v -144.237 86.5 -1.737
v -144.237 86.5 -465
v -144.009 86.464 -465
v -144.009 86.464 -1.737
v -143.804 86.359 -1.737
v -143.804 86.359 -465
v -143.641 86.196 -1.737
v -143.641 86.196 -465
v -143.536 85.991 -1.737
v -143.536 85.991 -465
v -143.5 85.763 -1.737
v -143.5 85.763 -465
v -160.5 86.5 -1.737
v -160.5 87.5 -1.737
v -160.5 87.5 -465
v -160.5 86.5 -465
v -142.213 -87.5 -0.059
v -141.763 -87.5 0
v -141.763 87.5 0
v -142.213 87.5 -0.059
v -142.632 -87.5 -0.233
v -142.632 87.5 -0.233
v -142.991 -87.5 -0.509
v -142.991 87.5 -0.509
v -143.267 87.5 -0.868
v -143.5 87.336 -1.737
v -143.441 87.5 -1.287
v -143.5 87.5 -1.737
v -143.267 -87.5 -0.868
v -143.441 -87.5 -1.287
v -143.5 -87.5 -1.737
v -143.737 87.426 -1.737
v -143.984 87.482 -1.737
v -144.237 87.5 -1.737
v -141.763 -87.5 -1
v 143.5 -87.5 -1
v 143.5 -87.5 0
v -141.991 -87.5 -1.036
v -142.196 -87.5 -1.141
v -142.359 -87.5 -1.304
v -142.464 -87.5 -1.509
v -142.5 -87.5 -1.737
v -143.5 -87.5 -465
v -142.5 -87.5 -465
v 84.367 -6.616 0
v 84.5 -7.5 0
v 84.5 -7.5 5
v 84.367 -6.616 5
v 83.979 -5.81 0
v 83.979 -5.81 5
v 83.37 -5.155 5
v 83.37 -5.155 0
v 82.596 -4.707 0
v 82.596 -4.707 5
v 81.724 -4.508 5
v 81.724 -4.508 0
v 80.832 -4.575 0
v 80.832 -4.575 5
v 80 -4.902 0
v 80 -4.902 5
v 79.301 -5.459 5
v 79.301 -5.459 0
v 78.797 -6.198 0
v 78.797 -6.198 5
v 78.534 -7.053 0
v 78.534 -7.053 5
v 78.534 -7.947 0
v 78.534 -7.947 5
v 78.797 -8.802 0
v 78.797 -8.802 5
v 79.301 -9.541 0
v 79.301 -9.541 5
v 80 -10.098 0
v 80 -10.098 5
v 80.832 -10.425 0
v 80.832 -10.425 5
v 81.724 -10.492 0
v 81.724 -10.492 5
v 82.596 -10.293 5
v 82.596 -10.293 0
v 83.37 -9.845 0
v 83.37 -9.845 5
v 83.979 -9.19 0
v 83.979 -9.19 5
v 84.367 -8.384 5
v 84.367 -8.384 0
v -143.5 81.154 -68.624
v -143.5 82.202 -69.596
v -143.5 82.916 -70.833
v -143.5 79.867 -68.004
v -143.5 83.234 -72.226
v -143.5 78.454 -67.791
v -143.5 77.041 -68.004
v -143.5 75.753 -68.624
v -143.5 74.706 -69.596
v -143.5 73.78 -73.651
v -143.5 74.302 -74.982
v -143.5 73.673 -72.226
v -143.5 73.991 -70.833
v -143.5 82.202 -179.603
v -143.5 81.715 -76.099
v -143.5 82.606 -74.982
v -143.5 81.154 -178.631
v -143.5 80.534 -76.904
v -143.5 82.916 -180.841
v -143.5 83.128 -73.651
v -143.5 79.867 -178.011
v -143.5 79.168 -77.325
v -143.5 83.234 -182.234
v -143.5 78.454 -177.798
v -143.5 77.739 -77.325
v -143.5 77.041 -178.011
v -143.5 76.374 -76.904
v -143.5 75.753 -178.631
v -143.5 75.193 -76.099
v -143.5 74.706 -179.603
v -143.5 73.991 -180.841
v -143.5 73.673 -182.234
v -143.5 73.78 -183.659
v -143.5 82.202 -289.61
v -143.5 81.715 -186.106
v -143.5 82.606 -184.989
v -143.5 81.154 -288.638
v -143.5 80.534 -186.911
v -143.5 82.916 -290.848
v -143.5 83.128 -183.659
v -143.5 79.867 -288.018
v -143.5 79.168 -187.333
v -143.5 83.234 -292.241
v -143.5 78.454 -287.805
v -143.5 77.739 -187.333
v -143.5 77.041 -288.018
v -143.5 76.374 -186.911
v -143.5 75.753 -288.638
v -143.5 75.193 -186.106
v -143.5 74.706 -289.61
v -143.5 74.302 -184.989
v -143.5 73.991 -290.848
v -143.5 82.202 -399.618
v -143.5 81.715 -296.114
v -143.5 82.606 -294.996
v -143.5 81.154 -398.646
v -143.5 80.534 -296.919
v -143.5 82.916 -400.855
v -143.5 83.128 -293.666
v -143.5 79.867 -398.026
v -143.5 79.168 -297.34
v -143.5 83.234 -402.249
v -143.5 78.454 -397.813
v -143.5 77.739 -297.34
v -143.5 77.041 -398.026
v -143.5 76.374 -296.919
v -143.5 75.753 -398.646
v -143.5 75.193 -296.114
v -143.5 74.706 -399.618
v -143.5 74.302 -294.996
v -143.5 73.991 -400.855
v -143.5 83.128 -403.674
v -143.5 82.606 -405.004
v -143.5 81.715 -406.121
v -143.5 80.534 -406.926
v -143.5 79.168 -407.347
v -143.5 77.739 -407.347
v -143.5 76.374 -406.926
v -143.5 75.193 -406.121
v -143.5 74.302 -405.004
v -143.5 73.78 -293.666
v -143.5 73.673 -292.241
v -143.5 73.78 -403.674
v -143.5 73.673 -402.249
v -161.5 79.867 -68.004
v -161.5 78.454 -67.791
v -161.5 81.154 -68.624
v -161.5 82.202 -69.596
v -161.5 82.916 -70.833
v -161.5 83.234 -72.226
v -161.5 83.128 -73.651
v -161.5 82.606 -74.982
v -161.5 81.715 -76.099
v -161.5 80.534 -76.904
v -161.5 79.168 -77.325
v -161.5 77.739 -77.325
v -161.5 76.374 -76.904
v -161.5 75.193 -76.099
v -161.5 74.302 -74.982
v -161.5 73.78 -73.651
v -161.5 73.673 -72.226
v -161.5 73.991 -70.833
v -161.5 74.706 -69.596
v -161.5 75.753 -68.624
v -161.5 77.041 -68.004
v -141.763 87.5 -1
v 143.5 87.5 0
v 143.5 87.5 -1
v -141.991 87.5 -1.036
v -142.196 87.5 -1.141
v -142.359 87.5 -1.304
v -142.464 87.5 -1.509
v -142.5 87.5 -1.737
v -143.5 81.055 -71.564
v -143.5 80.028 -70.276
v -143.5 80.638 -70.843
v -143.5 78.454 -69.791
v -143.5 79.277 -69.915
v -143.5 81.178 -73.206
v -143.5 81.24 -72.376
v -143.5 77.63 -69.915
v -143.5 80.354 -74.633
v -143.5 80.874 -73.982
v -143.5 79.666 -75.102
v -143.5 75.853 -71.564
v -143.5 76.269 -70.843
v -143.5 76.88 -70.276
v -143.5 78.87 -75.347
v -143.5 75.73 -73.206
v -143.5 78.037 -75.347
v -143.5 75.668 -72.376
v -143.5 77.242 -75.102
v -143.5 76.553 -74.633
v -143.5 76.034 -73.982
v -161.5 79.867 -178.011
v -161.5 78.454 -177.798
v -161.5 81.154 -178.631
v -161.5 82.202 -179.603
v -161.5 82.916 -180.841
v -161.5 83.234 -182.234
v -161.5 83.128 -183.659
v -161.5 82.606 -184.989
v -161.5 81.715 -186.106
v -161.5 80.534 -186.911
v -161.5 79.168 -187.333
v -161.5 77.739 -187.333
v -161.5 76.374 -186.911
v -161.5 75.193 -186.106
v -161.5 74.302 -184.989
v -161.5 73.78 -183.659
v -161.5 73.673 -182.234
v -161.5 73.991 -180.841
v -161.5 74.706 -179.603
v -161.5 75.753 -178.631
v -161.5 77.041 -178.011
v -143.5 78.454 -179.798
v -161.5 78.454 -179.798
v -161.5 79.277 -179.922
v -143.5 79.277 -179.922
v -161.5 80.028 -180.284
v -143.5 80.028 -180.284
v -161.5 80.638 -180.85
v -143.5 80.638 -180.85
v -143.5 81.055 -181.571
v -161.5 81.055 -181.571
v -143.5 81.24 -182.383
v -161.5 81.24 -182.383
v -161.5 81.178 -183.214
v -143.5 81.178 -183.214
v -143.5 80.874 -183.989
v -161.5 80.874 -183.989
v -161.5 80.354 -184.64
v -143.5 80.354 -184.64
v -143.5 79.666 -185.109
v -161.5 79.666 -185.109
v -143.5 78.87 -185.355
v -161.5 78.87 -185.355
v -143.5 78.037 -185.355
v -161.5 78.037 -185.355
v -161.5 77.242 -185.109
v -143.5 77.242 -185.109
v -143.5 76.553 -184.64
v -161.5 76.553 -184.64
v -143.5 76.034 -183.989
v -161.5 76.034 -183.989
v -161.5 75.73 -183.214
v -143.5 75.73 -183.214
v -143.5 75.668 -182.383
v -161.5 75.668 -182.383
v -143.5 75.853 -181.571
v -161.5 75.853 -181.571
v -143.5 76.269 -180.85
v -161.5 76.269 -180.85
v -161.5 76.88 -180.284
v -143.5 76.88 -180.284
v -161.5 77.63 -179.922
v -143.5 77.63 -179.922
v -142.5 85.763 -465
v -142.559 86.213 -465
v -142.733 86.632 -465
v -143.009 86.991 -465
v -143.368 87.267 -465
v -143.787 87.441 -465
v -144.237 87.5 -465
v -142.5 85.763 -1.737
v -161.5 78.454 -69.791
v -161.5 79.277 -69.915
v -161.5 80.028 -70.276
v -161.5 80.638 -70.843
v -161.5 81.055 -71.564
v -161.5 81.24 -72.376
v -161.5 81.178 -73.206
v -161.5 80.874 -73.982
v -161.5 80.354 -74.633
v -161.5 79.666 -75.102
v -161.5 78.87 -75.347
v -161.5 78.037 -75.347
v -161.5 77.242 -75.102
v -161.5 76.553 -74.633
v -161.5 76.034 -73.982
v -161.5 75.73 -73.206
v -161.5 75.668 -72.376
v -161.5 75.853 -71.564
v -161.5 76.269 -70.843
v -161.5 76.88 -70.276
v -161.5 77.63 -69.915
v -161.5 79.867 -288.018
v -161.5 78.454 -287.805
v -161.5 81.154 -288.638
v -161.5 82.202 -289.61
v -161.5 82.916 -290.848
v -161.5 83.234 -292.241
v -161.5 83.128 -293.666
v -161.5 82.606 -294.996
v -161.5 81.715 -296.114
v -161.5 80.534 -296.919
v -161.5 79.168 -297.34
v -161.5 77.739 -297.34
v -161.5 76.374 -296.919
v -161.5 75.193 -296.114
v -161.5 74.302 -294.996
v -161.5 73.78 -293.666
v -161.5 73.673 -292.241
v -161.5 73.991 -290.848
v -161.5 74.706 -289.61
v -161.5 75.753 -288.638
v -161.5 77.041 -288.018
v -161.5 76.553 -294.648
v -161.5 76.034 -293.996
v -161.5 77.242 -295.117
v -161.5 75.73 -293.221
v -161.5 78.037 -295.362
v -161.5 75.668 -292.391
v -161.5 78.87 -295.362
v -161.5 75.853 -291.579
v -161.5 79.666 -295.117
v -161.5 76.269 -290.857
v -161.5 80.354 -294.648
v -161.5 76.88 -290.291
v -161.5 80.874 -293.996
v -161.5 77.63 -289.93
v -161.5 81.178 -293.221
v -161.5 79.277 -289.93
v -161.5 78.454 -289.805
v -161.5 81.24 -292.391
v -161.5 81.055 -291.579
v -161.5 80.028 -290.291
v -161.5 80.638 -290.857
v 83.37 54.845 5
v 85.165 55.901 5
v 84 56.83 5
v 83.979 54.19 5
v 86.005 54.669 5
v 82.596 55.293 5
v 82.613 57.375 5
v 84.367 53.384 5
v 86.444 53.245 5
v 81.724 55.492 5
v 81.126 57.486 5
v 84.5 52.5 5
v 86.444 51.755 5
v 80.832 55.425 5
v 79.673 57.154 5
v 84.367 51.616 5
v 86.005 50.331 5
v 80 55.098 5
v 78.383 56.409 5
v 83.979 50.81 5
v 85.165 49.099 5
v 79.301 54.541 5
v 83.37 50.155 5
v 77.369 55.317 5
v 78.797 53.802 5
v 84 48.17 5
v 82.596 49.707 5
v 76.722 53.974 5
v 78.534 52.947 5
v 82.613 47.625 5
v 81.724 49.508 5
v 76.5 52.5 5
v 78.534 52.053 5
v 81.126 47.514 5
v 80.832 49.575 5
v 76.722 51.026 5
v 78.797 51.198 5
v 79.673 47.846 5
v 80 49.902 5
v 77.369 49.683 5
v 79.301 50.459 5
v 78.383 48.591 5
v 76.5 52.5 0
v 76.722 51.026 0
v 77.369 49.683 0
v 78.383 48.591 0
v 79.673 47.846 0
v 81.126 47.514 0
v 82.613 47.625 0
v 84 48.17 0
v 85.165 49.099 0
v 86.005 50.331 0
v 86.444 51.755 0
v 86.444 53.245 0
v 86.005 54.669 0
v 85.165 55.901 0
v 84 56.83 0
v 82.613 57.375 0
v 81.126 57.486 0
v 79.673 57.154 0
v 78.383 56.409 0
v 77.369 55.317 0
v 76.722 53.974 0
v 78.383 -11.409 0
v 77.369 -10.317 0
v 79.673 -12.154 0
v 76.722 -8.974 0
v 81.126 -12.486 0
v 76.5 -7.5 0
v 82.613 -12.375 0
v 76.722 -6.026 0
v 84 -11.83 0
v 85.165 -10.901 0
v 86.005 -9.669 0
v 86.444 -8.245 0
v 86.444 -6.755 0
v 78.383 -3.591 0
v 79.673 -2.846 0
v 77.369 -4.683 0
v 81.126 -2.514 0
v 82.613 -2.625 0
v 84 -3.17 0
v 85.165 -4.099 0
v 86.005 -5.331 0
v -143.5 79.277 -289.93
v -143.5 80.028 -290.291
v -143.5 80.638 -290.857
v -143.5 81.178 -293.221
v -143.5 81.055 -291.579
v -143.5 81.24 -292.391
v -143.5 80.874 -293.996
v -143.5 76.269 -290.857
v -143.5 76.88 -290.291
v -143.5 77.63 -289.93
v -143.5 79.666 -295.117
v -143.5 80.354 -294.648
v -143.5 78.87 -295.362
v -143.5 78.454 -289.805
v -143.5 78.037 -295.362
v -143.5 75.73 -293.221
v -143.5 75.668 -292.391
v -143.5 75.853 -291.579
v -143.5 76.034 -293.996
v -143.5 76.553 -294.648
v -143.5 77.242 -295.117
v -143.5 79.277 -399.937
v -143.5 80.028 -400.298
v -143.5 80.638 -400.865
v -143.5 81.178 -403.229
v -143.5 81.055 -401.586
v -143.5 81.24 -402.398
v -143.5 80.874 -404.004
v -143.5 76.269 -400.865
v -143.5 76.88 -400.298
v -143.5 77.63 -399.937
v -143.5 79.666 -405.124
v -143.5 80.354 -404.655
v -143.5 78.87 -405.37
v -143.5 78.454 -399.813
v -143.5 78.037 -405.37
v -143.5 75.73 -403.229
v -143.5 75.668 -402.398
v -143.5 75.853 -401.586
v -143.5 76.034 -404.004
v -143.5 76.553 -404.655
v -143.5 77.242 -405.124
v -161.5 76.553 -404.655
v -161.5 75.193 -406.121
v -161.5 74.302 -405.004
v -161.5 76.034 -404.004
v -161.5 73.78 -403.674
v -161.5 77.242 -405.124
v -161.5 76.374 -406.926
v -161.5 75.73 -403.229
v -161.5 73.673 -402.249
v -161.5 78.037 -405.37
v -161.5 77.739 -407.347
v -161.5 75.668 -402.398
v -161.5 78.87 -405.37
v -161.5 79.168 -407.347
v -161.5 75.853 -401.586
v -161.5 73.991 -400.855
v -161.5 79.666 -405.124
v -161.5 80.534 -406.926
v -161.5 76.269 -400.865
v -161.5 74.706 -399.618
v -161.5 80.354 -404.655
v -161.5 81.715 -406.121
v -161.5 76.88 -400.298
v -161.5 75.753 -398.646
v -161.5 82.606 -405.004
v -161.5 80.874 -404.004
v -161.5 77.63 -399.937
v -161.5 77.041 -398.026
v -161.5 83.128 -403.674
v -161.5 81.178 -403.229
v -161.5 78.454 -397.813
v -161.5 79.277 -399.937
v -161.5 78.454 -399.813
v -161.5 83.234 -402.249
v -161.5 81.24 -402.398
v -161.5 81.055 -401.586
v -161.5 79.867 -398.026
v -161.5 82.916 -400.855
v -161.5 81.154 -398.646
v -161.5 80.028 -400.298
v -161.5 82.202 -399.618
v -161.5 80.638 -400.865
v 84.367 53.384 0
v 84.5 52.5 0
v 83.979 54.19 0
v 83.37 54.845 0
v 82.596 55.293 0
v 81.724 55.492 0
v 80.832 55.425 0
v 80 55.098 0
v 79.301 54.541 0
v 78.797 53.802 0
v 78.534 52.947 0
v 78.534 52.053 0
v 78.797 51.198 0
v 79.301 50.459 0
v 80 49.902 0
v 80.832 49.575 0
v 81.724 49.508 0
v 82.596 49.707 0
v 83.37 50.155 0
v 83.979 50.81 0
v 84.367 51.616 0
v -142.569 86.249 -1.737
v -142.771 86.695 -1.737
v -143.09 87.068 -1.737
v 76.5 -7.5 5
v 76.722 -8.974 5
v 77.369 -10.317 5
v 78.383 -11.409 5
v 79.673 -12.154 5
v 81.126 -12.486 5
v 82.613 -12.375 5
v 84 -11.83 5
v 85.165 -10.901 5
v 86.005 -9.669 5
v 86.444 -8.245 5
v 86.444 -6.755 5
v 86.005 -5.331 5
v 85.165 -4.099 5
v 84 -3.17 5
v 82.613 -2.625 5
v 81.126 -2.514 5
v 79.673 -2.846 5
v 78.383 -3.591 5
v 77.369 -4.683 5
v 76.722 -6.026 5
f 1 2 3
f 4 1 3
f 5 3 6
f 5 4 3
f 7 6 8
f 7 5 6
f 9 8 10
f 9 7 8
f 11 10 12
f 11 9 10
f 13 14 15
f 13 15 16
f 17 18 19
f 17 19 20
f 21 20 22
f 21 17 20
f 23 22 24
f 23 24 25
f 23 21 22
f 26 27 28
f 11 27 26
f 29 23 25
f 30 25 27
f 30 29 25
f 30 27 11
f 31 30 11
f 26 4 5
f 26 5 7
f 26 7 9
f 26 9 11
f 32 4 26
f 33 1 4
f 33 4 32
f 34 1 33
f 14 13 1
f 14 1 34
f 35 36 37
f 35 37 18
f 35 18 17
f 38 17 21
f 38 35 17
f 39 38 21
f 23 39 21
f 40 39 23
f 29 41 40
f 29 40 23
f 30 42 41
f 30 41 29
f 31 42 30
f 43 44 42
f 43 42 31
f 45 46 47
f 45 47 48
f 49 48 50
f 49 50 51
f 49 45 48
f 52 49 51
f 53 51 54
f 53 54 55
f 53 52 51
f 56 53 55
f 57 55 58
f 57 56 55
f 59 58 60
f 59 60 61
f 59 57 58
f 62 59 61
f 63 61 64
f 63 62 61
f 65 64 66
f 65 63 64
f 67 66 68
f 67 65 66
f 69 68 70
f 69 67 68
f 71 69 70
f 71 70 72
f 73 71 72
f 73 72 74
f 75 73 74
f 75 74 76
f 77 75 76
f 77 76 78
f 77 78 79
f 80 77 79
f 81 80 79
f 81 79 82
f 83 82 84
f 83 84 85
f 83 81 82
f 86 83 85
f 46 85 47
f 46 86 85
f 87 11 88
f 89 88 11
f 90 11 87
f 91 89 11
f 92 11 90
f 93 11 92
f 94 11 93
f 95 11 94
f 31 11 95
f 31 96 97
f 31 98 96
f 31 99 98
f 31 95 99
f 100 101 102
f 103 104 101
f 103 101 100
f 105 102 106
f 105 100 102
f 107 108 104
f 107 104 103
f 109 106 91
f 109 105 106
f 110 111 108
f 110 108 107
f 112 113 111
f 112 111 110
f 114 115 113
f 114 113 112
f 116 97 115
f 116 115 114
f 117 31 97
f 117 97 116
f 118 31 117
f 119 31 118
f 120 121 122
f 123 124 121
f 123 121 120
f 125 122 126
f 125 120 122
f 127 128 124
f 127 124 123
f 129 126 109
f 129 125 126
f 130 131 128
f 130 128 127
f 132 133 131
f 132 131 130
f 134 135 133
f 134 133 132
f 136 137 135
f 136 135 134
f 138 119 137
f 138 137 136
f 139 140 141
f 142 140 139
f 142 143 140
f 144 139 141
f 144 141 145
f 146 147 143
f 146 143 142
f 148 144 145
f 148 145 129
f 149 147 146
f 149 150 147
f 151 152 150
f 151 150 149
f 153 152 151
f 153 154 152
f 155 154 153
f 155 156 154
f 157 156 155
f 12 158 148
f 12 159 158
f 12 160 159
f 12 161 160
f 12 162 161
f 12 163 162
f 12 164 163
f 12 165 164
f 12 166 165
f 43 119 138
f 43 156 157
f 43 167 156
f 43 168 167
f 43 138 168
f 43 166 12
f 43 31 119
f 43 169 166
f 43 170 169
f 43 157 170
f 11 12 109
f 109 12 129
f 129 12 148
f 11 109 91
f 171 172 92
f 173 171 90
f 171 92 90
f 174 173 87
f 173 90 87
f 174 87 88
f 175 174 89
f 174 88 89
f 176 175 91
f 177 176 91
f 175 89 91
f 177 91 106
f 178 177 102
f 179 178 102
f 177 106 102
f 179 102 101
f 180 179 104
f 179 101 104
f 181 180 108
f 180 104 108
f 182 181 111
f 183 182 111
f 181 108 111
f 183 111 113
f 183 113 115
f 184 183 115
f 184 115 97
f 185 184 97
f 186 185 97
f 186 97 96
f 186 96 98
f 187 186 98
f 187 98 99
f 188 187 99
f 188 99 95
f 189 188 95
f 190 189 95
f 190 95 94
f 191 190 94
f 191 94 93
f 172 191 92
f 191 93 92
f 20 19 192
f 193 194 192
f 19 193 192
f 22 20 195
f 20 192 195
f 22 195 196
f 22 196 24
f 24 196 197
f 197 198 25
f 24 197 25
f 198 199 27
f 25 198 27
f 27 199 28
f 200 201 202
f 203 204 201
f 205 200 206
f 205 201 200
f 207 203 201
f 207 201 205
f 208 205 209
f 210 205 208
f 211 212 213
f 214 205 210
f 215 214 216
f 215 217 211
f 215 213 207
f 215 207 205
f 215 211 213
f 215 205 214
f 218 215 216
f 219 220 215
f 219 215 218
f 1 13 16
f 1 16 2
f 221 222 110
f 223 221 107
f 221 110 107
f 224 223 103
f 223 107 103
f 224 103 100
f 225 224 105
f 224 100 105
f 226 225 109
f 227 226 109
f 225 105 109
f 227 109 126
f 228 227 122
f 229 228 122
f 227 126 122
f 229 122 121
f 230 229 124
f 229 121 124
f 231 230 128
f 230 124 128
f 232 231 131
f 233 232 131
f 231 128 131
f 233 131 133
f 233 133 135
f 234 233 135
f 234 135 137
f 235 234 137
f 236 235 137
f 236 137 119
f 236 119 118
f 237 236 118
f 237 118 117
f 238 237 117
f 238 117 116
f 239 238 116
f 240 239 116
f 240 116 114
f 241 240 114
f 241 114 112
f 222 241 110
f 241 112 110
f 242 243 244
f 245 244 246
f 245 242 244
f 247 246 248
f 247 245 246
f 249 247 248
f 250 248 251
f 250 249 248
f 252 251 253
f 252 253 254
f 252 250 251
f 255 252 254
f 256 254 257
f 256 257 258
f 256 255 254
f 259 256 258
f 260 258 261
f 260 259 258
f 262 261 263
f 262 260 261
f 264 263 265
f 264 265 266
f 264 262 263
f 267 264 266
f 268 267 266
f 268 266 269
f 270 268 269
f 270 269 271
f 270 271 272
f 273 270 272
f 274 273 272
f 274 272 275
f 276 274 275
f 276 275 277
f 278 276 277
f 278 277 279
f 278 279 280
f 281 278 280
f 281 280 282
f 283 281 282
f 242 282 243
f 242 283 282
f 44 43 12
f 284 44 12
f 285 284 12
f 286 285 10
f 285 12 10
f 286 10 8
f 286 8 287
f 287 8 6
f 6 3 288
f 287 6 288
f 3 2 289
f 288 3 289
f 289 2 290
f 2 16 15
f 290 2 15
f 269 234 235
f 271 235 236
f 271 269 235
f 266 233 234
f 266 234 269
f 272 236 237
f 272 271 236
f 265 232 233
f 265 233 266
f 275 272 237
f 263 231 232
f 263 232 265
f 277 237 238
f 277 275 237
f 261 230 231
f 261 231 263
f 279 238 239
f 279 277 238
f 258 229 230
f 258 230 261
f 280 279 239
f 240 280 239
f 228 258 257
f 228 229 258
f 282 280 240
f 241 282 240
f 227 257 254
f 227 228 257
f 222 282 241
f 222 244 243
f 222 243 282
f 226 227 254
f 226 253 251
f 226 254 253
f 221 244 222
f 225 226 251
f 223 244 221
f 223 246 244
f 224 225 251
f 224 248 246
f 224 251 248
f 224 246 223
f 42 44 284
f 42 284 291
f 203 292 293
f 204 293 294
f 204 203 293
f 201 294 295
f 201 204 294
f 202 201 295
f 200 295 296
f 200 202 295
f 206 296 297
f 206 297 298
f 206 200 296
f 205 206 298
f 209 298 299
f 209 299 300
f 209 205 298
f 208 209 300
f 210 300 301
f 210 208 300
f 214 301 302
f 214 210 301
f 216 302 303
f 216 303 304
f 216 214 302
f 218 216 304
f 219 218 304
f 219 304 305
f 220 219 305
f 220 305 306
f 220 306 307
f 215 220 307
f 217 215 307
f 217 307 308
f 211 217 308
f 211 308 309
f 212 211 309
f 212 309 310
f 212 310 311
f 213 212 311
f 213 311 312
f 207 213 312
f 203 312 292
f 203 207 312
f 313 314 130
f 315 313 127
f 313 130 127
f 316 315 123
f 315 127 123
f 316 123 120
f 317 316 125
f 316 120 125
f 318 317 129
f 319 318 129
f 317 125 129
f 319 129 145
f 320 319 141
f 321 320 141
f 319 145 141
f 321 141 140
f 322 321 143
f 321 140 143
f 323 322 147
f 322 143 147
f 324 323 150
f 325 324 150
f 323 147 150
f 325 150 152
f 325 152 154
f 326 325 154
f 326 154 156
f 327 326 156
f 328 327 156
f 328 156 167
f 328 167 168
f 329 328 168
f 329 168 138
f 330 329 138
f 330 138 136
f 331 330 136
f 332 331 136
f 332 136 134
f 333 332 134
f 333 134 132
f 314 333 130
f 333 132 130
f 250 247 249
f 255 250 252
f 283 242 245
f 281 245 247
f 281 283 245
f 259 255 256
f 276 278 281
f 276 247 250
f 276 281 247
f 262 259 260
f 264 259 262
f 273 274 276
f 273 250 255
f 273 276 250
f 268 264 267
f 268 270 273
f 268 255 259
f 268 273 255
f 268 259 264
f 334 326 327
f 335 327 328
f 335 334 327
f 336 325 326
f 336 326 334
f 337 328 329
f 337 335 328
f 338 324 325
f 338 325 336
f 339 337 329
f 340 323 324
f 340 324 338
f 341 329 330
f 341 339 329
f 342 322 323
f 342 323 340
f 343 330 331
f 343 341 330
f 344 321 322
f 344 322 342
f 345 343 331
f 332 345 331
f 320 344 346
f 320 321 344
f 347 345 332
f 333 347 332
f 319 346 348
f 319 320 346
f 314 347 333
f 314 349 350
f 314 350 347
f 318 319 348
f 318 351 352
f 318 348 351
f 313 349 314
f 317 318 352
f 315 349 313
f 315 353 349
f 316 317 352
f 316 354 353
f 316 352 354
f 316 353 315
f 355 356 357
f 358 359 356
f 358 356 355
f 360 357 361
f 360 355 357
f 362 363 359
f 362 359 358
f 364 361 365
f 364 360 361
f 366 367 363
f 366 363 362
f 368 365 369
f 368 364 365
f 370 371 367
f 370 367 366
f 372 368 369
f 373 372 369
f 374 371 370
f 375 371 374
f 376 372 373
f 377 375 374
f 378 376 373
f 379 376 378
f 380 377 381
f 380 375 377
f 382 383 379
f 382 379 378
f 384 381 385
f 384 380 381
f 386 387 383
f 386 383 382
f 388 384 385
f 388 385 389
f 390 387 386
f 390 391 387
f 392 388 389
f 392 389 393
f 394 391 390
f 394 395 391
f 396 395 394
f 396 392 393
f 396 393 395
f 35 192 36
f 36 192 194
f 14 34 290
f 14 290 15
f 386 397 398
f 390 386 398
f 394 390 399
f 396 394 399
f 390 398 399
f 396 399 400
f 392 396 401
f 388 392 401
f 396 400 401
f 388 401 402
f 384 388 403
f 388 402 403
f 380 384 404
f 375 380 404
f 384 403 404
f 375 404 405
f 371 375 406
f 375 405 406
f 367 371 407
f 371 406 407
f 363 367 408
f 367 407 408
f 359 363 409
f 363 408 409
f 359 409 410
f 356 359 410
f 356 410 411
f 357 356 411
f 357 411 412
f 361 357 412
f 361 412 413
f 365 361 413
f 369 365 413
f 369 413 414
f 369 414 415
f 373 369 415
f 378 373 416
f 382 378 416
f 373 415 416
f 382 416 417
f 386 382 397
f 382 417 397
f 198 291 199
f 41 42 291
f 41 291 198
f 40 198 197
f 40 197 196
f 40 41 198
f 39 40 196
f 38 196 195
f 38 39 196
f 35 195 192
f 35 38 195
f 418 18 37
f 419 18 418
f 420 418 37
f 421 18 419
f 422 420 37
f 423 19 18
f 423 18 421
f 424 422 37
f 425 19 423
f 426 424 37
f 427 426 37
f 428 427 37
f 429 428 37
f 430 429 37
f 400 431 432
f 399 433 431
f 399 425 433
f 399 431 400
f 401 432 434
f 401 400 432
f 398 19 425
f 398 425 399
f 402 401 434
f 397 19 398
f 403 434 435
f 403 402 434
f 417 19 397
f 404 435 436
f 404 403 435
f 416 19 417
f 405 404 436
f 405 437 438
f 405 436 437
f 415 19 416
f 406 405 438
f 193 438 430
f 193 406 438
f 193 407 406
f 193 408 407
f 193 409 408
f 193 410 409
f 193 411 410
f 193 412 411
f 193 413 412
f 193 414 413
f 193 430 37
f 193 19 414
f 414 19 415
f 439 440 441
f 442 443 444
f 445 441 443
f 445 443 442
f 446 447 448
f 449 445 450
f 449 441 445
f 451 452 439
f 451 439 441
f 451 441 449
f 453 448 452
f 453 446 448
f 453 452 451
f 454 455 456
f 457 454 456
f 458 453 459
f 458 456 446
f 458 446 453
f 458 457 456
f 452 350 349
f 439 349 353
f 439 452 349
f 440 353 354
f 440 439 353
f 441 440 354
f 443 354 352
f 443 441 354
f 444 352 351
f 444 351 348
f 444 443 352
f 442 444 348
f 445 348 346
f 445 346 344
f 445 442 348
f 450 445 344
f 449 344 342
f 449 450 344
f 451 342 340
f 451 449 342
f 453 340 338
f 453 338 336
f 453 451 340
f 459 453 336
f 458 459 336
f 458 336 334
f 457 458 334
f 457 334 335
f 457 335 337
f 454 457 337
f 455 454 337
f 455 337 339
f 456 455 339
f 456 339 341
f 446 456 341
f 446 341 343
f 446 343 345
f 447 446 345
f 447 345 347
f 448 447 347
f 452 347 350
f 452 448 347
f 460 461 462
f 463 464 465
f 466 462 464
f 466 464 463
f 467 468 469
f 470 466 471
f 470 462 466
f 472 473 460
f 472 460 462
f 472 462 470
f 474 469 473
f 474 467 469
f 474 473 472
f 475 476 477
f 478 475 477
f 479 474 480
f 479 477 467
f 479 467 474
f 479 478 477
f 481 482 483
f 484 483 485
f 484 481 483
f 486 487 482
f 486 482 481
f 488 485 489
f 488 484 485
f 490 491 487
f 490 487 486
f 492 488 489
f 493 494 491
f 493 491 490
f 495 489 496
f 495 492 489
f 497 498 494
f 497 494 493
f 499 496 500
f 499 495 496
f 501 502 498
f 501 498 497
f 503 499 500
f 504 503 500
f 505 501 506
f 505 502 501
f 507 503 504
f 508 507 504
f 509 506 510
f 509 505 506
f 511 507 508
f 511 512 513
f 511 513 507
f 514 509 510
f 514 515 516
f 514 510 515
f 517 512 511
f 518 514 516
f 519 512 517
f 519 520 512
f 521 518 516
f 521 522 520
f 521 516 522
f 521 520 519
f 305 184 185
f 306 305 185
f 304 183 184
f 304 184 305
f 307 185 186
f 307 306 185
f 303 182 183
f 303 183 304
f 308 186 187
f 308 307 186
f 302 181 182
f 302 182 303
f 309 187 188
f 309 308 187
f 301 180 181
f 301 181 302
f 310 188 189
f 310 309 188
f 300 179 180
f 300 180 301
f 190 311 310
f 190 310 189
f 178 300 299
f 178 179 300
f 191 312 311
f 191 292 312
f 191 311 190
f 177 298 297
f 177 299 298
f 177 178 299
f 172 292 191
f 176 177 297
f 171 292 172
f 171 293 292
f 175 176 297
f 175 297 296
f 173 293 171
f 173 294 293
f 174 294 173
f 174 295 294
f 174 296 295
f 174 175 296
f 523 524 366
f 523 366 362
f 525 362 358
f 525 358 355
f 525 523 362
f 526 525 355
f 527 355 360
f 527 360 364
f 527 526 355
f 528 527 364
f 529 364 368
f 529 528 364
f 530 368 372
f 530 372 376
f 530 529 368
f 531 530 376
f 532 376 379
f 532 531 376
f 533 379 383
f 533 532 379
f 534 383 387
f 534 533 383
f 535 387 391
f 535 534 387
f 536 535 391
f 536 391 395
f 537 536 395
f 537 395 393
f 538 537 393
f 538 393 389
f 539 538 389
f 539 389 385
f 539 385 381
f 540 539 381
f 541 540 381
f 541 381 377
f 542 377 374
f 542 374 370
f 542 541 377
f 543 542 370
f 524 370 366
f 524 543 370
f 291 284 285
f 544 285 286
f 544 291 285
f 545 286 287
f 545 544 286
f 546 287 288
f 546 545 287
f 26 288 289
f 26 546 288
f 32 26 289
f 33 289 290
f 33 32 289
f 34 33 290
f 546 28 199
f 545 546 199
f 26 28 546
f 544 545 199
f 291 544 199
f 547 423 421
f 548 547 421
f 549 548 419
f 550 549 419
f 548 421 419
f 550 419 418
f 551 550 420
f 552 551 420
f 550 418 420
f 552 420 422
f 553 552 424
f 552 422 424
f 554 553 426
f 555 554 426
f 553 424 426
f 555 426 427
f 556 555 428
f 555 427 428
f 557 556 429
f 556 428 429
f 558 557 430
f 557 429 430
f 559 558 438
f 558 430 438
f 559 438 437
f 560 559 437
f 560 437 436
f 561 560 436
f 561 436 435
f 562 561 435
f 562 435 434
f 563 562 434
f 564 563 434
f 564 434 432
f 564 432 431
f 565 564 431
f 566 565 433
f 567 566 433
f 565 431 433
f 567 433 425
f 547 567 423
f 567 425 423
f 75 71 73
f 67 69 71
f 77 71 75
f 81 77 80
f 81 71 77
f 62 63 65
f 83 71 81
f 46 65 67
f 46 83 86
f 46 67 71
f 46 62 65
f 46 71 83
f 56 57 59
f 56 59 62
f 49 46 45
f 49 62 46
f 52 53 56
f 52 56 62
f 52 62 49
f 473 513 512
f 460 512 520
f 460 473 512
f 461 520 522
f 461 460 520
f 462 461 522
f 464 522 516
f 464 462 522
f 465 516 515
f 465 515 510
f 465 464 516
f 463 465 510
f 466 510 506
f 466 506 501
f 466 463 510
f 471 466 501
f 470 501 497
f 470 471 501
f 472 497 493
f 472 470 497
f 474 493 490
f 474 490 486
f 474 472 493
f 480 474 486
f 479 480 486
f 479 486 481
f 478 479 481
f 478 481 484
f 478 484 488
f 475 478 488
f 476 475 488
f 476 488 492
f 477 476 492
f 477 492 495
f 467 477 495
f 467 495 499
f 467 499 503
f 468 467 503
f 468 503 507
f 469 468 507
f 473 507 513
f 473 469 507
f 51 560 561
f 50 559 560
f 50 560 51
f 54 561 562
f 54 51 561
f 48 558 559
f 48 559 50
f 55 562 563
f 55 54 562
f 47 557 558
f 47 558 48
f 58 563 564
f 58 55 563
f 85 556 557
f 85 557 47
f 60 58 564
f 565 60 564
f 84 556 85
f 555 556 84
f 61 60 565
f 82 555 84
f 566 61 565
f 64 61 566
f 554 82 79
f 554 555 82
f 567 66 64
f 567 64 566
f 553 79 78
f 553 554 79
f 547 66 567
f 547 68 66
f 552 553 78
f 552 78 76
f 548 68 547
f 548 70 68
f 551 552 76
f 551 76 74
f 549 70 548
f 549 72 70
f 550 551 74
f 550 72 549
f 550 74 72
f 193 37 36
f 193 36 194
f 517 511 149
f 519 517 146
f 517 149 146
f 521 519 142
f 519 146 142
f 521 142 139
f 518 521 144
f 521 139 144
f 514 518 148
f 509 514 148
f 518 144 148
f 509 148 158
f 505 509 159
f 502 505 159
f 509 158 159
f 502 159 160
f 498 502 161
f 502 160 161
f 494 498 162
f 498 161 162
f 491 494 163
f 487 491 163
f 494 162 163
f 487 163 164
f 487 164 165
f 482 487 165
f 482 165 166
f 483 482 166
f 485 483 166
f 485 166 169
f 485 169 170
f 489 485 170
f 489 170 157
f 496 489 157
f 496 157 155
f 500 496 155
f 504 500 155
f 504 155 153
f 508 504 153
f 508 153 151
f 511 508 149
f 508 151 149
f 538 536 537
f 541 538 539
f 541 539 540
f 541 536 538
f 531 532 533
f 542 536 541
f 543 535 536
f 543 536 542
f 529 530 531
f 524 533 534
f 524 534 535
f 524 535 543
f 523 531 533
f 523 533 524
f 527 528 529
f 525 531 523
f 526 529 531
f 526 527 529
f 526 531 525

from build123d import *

# Parameters (mm, degrees)
SKETCH1_W                    = 287
SKETCH1_H                    = 175
BASE_FLANGE1_DEPTH           = 1
EDGE_FLANGE1_STRIP_W         = 5.4732
EDGE_FLANGE1_STRIP_H         = 1
EDGE_FLANGE1_STRIP_CUT_DEPTH = 175
EDGE_FLANGE1_DEPTH           = 175
EDGE_FLANGE2_STRIP_W         = 5.4732
EDGE_FLANGE2_STRIP_H         = 1
EDGE_FLANGE2_STRIP_CUT_DEPTH = 463.2634
EDGE_FLANGE2_DEPTH           = 463.2634
SKETCH17_R                   = 4.794
SKETCH17_R_2                 = 2.794
BOSS_EXTRUDE1_DEPTH          = 18
SKETCH21_R                   = 5
SKETCH21_R_2                 = 3
BOSS_EXTRUDE2_DEPTH          = 5


# Sheet-metal steps are written as plain solids
with BuildPart() as part:
    # Sketch1 → Base-Flange1 (new body)
    with BuildSketch(Plane.XY):
        Rectangle(SKETCH1_W, SKETCH1_H)
    extrude(amount=-BASE_FLANGE1_DEPTH)

    # Edge-Flange1 strip (across the edge) → Edge-Flange1 strip cut (cut)
    with BuildSketch(Plane(origin=(-143.5, -87.5, -1), x_dir=(1, 0, 0), z_dir=(0, 1, 0))):
        with Locations((-1, -0.5)):
            Rectangle(EDGE_FLANGE1_STRIP_W, EDGE_FLANGE1_STRIP_H)
    extrude(amount=EDGE_FLANGE1_STRIP_CUT_DEPTH, mode=Mode.SUBTRACT)

    # Edge-Flange1 section (across the edge) → Edge-Flange1 (add)
    with BuildSketch(Plane(origin=(-143.5, -87.5, -1), x_dir=(1, 0, 0), z_dir=(0, 1, 0))):
        with BuildLine():
            Line((0, 0.7366), (0, 464))
            Line((0, 464), (1, 464))
            Line((1, 464), (1, 0.7366))
            ThreePointArc((1, 0.7366), (1.215745145, 0.215745145), (1.7366, 0))
            Line((1.7366, 0), (1.7366, -1))
            ThreePointArc((1.7366, -1), (0.508638364, -0.491361636), (0, 0.7366))
        make_face()
    extrude(amount=EDGE_FLANGE1_DEPTH)

    # Edge-Flange2 strip (across the edge) → Edge-Flange2 strip cut (cut)
    with BuildSketch(Plane(origin=(-143.5, 87.5, -1.7366), x_dir=(0, -1, 0), z_dir=(0, 0, -1))):
        with Locations((-1, -0.5)):
            Rectangle(EDGE_FLANGE2_STRIP_W, EDGE_FLANGE2_STRIP_H)
    extrude(amount=EDGE_FLANGE2_STRIP_CUT_DEPTH, mode=Mode.SUBTRACT)

    # Edge-Flange2 section (across the edge) → Edge-Flange2 (add)
    with BuildSketch(Plane(origin=(-143.5, 87.5, -1.7366), x_dir=(0, -1, 0), z_dir=(0, 0, -1))):
        with BuildLine():
            Line((0, 0.7366), (0, 17))
            Line((0, 17), (1, 17))
            Line((1, 17), (1, 0.7366))
            ThreePointArc((1, 0.7366), (1.215745145, 0.215745145), (1.7366, 0))
            Line((1.7366, 0), (1.7366, -1))
            ThreePointArc((1.7366, -1), (0.508638364, -0.491361636), (0, 0.7366))
        make_face()
    extrude(amount=EDGE_FLANGE2_DEPTH)

    # Sketch17 → Boss-Extrude1 (add)
    # profile 1 of 4: a face of its own
    with BuildSketch(Plane.ZY.offset(143.5)):
        with Locations((-72.584668807, 78.453866984)):
            Circle(SKETCH17_R)
        with Locations((-72.584668807, 78.453866984)):
            Circle(SKETCH17_R_2, mode=Mode.SUBTRACT)
    # profile 2 of 4: a face of its own
    with BuildSketch(Plane.ZY.offset(143.5)):
        with Locations((-182.592068807, 78.453866984)):
            Circle(SKETCH17_R)
        with Locations((-182.592068807, 78.453866984)):
            Circle(SKETCH17_R_2, mode=Mode.SUBTRACT)
    # profile 3 of 4: a face of its own
    with BuildSketch(Plane.ZY.offset(143.5)):
        with Locations((-292.599468807, 78.453866984)):
            Circle(SKETCH17_R)
        with Locations((-292.599468807, 78.453866984)):
            Circle(SKETCH17_R_2, mode=Mode.SUBTRACT)
    # profile 4 of 4: a face of its own
    with BuildSketch(Plane.ZY.offset(143.5)):
        with Locations((-402.606868807, 78.453866984)):
            Circle(SKETCH17_R)
        with Locations((-402.606868807, 78.453866984)):
            Circle(SKETCH17_R_2, mode=Mode.SUBTRACT)
    extrude(amount=BOSS_EXTRUDE1_DEPTH)

    # Sketch21 → Boss-Extrude2 (add)
    # profile 1 of 2: a face of its own
    with BuildSketch(Plane.XY):
        with Locations(Location((81.5, 52.5, 0), (0, 0, 180))):
            Circle(SKETCH21_R)
        with Locations((81.5, 52.5)):
            Circle(SKETCH21_R_2, mode=Mode.SUBTRACT)
    # profile 2 of 2: a face of its own
    with BuildSketch(Plane.XY):
        with Locations(Location((81.5, -7.5, 0), (0, 0, 180))):
            Circle(SKETCH21_R)
        with Locations((81.5, -7.5)):
            Circle(SKETCH21_R_2, mode=Mode.SUBTRACT)
    extrude(amount=BOSS_EXTRUDE2_DEPTH)


solid = part.part
